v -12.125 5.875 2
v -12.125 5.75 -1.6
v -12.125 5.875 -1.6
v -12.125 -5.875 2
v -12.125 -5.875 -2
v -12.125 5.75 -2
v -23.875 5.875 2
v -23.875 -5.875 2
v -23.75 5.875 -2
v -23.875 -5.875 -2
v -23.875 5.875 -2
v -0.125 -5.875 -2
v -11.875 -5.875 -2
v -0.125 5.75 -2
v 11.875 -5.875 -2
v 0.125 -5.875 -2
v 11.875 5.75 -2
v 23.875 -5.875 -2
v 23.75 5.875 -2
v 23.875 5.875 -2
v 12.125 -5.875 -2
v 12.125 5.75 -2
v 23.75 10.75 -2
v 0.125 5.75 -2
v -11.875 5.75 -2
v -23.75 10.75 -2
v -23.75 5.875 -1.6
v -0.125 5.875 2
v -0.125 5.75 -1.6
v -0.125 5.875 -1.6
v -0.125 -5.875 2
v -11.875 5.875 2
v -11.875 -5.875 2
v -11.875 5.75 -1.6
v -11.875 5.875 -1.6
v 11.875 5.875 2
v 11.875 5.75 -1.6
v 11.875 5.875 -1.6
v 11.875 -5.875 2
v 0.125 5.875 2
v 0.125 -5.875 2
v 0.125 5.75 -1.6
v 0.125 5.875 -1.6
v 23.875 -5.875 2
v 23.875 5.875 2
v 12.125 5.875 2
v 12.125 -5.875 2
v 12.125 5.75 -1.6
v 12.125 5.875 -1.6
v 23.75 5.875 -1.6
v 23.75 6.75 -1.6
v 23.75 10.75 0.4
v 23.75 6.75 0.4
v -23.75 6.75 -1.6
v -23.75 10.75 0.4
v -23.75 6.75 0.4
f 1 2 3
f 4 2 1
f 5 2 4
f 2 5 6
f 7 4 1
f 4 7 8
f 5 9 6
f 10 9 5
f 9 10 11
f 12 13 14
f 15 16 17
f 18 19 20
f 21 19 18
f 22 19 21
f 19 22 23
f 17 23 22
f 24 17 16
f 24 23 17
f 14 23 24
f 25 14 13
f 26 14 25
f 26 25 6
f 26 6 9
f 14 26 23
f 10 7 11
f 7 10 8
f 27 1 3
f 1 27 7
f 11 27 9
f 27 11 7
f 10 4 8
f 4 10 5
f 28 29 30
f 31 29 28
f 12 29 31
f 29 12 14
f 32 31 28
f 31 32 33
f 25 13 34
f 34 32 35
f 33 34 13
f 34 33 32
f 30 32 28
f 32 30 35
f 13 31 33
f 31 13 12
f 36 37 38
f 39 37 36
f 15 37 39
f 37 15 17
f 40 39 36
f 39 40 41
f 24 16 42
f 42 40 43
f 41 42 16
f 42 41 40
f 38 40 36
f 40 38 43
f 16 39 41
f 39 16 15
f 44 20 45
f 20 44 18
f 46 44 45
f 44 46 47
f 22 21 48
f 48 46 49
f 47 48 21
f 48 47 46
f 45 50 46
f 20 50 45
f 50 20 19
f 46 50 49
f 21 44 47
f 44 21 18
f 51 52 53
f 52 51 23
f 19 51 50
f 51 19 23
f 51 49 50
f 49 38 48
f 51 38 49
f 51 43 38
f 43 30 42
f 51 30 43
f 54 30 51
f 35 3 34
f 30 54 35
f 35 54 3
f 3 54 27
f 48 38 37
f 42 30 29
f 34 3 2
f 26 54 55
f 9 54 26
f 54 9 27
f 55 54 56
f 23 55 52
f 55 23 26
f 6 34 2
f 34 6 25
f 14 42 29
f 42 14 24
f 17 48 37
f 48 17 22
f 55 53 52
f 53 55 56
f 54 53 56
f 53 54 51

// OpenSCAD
// Definitions
// **************************

btn_size=12;
btn_thick = 4;
hinge_thick = 0.4;
fix_block_thick =2;
num_buttons = 4;
gap=0.5;
hinge_depth=5;

//Definition of circle angular resolution
$fn = 128;  

difference() {
    for (i=[0:1:num_buttons-1]) {
    translate ([-(btn_size*num_buttons/2)+btn_size/2+i*btn_size,0,0]) cube([btn_size-gap/2,btn_size-gap/2,btn_thick], center=true);
    }



}
     
    translate ([0,btn_size/2+hinge_depth/2-gap/2,-btn_thick/2+hinge_thick/2
]) cube([btn_size*num_buttons-gap,hinge_depth,hinge_thick], center=true); //hinge


difference() {

    translate ([0,btn_size/2+hinge_depth/2-gap/2+0.5,-btn_thick/2+hinge_thick/2+fix_block_thick/2
]) cube([btn_size*num_buttons-gap,hinge_depth-1,hinge_thick+fix_block_thick], center=true); //hinge block


}



 
